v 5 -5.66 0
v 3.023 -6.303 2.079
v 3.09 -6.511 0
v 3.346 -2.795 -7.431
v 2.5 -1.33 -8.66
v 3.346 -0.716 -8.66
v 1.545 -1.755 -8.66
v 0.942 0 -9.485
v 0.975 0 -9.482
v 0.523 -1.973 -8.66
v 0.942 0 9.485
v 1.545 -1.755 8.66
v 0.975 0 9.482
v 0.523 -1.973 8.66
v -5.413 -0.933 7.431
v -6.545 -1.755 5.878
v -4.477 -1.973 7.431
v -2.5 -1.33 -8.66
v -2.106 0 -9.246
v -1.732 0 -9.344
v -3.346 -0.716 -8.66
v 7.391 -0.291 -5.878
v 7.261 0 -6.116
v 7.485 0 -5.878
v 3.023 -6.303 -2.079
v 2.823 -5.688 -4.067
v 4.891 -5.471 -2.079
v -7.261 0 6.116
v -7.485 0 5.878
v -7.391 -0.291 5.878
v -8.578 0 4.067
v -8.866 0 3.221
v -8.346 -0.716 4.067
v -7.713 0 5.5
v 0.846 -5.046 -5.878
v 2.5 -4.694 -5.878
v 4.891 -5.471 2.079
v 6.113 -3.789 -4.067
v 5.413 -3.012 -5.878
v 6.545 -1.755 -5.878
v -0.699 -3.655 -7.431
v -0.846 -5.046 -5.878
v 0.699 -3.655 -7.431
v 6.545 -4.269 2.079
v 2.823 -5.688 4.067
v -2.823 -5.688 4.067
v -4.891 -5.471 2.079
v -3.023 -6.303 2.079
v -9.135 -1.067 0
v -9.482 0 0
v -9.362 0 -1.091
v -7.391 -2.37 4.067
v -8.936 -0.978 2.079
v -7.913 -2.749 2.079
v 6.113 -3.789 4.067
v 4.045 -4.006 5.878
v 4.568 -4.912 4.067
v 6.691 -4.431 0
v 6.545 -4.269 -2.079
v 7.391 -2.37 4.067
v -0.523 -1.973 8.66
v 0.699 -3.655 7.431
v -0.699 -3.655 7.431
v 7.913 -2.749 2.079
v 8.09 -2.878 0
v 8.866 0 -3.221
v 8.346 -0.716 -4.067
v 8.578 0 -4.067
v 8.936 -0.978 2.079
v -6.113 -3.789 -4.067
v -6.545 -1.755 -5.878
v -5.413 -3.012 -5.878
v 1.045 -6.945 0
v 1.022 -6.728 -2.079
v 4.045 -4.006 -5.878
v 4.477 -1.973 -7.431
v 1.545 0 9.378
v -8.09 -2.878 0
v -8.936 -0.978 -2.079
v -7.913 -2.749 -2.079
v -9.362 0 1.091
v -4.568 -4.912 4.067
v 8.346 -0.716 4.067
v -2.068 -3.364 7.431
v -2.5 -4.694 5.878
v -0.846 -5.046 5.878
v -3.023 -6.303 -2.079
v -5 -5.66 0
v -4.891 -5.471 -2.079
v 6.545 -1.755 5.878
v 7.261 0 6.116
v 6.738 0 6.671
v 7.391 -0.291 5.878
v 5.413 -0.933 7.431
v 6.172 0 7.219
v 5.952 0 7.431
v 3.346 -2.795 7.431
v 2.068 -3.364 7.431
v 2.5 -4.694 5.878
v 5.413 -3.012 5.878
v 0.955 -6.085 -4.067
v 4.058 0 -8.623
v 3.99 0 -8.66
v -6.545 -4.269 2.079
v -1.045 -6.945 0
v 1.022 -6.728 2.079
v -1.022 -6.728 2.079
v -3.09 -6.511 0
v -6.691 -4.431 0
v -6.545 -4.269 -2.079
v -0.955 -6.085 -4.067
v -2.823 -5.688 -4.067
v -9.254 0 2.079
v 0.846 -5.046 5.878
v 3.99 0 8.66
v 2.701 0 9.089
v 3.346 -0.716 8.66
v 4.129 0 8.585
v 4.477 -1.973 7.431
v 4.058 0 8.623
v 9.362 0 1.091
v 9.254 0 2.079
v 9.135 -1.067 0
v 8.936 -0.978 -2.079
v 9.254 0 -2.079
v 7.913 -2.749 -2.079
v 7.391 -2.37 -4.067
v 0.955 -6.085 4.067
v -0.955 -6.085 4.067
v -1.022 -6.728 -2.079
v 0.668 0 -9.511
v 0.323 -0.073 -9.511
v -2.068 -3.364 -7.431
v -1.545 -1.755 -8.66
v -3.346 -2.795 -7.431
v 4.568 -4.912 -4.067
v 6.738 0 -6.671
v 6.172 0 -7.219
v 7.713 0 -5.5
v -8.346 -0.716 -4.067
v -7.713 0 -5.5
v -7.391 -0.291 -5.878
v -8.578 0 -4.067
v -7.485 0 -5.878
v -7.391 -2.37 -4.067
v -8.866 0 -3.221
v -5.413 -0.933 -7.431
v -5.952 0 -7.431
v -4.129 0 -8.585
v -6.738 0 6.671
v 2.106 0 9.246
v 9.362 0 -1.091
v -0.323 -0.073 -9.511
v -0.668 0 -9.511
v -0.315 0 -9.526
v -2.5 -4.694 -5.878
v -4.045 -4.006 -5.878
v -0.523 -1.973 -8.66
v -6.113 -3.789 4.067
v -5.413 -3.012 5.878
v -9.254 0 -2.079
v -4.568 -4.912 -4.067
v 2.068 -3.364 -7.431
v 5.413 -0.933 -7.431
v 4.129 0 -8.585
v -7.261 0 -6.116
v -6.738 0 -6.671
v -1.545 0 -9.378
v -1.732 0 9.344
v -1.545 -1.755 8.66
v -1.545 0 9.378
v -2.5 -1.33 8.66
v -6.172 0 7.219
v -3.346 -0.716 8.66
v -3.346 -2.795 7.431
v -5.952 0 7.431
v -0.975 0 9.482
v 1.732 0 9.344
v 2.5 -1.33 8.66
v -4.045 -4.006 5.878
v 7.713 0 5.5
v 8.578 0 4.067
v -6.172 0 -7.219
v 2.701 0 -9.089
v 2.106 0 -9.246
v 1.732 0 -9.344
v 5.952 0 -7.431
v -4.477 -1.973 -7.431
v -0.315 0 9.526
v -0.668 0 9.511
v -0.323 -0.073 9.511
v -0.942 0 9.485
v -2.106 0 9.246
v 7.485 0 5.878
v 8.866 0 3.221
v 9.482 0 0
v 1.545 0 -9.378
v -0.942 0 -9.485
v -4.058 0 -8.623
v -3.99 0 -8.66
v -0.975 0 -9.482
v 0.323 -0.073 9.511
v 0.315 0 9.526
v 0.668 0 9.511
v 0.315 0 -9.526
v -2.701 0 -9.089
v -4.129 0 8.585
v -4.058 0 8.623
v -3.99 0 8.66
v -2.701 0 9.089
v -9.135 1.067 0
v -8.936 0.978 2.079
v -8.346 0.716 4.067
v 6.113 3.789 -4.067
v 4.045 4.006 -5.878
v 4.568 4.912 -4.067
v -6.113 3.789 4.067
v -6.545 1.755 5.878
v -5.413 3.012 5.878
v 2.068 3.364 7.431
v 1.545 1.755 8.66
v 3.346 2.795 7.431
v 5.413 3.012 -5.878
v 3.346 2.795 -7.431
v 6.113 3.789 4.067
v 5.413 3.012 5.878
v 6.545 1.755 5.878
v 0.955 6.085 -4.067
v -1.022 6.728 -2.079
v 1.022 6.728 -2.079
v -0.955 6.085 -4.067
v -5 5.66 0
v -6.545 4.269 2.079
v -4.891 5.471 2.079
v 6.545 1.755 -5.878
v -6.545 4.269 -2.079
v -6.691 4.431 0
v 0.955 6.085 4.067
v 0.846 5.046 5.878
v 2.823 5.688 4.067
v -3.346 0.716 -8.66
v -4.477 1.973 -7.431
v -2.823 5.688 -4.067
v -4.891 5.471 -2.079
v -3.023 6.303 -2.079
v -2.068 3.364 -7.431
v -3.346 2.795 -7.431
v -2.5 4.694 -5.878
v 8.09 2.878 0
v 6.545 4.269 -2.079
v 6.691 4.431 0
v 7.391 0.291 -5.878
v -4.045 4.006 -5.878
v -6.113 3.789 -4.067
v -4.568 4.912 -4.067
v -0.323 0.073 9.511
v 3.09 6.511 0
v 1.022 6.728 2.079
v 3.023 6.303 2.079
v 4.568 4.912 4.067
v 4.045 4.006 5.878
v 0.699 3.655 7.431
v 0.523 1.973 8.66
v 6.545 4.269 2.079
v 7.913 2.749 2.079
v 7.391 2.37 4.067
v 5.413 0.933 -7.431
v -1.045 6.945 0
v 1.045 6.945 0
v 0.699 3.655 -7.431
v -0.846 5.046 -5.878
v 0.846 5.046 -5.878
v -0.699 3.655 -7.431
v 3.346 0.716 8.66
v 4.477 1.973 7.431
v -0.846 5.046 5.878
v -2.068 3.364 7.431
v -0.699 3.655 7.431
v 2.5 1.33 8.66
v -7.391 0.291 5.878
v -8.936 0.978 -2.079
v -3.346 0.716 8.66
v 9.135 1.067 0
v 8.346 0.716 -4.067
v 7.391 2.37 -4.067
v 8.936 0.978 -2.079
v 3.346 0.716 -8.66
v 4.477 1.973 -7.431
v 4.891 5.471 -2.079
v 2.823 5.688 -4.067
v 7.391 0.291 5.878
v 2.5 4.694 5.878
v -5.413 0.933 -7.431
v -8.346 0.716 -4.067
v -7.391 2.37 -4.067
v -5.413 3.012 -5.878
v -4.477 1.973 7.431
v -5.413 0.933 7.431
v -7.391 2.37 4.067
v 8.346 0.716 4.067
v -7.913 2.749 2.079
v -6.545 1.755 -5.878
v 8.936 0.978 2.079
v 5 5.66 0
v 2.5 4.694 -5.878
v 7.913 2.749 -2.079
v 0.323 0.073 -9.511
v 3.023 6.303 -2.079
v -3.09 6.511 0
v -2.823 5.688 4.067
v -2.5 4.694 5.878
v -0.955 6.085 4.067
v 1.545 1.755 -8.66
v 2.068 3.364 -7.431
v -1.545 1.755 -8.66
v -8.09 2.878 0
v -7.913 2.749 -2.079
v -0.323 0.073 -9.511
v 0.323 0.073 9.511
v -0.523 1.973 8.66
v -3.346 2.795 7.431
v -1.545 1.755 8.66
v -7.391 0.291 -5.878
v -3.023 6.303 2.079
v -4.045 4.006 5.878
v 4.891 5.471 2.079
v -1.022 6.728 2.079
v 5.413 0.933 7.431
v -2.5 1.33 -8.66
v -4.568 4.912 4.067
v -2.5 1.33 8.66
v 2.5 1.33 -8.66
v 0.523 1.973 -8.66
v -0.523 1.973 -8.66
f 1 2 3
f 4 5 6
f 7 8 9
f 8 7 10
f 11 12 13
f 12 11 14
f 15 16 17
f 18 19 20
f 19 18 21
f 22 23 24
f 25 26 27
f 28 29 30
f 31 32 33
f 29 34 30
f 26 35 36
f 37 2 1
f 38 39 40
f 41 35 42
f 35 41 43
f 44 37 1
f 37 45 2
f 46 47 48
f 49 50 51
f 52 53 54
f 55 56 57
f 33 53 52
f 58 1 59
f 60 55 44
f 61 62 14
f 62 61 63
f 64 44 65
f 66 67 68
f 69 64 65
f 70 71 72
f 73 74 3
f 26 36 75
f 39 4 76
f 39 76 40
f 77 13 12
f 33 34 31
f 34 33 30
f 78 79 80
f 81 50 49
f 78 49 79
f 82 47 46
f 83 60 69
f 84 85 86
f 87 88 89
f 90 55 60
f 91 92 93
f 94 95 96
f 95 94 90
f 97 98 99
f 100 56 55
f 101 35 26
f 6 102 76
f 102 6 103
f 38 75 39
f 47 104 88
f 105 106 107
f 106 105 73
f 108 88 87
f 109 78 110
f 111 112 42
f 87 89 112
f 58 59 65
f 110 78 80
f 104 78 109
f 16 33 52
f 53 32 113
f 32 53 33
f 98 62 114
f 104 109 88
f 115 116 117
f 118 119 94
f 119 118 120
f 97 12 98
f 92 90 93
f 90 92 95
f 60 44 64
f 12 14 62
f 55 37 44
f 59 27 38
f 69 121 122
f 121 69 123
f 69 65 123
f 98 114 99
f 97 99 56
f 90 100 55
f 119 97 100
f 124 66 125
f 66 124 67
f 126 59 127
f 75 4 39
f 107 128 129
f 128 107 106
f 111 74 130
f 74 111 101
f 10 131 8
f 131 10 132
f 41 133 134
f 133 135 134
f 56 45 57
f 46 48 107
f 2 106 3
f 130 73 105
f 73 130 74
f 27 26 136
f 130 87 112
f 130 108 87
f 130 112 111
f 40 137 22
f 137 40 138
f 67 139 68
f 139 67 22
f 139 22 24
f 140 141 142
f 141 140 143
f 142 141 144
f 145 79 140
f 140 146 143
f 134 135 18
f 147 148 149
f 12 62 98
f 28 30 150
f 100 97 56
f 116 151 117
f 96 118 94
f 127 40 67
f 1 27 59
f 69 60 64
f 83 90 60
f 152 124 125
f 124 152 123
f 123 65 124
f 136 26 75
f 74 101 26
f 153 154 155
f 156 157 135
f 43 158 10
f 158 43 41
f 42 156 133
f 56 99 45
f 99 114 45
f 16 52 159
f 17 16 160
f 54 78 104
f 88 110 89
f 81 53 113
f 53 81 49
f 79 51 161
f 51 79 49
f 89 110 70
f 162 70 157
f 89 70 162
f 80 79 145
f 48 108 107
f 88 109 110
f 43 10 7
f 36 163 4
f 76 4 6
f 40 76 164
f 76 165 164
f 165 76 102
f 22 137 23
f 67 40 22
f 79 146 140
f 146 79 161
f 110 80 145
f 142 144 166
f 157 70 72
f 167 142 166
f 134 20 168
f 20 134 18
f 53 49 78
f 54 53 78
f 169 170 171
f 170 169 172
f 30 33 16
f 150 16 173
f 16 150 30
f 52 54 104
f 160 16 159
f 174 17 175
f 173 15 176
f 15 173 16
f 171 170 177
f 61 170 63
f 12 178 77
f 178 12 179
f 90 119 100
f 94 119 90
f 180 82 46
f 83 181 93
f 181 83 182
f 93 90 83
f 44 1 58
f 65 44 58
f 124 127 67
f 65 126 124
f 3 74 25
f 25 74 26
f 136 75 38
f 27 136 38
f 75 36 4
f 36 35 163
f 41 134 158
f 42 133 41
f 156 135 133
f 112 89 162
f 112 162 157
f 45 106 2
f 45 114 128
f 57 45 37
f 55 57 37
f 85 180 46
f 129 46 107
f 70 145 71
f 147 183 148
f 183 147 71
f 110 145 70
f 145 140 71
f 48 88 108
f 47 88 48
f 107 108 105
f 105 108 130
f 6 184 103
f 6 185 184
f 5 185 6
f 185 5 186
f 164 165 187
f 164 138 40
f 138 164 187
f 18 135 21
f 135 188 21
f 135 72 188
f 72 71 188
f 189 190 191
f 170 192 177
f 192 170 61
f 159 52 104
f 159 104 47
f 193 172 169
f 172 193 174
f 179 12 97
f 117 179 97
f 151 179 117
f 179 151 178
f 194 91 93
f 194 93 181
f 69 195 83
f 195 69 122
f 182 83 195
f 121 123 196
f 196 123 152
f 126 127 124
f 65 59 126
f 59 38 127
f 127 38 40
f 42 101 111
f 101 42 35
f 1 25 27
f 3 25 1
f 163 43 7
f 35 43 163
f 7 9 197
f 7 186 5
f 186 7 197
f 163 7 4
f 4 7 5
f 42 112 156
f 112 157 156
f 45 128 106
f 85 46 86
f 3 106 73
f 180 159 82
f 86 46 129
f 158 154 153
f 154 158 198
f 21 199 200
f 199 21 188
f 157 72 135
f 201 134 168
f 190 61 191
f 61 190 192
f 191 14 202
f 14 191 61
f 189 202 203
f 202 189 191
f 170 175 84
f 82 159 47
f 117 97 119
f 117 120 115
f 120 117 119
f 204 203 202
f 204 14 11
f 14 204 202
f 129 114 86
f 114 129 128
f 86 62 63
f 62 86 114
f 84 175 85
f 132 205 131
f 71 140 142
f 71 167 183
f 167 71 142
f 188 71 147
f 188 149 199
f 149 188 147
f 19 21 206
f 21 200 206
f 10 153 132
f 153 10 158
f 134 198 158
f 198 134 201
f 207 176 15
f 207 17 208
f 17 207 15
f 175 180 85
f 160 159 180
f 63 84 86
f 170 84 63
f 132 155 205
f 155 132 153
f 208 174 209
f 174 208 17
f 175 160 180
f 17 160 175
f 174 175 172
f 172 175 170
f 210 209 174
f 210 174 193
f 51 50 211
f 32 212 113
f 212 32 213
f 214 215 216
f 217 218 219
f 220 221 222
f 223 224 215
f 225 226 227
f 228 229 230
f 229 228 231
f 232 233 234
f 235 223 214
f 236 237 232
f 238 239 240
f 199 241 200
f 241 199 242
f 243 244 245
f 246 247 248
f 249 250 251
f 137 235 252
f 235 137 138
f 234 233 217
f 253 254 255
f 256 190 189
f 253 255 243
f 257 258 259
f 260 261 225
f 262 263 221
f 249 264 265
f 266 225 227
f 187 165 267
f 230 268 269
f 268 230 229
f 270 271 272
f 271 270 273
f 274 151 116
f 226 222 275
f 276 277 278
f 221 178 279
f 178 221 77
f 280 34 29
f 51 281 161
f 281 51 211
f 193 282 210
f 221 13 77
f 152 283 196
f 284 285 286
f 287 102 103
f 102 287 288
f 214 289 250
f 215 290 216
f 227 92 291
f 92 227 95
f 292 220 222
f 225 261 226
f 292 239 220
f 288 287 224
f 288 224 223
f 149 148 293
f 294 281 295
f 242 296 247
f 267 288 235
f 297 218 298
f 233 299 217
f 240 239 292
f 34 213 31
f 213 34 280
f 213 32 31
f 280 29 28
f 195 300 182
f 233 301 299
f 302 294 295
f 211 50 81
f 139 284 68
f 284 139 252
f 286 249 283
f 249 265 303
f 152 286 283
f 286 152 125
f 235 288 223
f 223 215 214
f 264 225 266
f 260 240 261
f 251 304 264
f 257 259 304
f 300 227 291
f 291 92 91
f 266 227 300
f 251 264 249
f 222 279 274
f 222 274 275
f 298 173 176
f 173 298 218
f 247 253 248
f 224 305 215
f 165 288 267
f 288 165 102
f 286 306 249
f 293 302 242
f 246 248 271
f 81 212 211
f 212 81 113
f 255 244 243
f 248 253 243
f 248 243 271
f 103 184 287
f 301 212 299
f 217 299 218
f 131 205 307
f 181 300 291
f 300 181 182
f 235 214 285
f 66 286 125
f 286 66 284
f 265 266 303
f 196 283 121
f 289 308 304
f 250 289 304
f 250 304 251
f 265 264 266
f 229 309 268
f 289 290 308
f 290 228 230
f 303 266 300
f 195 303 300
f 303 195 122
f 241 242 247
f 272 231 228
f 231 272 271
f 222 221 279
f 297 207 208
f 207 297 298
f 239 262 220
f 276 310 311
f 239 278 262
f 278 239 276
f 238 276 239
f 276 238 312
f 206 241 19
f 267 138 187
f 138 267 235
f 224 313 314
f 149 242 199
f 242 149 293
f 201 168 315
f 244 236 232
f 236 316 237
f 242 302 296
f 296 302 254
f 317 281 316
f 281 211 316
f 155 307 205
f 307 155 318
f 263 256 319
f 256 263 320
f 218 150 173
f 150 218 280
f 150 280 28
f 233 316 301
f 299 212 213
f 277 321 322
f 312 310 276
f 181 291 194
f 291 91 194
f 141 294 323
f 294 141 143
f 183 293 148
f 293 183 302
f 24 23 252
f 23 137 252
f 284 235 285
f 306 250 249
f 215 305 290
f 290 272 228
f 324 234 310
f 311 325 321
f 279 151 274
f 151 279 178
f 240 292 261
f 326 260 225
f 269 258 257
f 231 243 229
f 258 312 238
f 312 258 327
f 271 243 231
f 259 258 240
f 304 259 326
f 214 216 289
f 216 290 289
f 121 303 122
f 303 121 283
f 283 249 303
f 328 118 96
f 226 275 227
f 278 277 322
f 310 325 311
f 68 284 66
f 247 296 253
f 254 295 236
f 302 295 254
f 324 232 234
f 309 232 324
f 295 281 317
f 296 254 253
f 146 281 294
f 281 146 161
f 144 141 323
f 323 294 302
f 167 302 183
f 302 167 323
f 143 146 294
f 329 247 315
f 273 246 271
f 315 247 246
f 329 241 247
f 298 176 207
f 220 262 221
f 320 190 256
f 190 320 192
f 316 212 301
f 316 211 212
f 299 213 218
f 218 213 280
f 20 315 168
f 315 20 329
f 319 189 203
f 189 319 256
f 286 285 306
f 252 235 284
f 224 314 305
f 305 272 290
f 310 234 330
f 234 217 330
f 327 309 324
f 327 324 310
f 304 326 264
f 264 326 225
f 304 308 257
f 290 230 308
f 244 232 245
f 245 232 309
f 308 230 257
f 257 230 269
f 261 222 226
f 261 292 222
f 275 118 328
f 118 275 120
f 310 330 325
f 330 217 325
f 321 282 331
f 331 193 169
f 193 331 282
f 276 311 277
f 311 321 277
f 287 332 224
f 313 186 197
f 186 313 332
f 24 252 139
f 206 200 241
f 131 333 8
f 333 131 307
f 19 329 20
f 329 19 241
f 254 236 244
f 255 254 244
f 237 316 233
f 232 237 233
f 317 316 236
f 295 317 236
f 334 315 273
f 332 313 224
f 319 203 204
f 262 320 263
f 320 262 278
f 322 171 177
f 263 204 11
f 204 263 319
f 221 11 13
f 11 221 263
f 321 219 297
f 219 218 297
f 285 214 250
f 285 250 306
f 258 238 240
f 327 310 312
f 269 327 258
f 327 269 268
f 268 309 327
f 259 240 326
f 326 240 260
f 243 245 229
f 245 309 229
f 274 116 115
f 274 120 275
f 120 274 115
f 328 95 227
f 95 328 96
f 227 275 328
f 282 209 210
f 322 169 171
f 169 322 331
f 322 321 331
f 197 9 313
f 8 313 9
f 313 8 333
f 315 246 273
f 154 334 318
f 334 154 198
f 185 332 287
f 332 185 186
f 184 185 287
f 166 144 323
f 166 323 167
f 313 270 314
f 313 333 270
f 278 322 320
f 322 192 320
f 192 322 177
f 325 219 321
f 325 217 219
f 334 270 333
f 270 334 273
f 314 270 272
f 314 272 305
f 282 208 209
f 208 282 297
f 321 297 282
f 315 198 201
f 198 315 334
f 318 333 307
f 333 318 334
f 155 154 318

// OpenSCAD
intersection() {
    translate([0, 3, 0])
        sphere(r=10);
    translate([0, -3, 0])
        sphere(r=10.0);
}
